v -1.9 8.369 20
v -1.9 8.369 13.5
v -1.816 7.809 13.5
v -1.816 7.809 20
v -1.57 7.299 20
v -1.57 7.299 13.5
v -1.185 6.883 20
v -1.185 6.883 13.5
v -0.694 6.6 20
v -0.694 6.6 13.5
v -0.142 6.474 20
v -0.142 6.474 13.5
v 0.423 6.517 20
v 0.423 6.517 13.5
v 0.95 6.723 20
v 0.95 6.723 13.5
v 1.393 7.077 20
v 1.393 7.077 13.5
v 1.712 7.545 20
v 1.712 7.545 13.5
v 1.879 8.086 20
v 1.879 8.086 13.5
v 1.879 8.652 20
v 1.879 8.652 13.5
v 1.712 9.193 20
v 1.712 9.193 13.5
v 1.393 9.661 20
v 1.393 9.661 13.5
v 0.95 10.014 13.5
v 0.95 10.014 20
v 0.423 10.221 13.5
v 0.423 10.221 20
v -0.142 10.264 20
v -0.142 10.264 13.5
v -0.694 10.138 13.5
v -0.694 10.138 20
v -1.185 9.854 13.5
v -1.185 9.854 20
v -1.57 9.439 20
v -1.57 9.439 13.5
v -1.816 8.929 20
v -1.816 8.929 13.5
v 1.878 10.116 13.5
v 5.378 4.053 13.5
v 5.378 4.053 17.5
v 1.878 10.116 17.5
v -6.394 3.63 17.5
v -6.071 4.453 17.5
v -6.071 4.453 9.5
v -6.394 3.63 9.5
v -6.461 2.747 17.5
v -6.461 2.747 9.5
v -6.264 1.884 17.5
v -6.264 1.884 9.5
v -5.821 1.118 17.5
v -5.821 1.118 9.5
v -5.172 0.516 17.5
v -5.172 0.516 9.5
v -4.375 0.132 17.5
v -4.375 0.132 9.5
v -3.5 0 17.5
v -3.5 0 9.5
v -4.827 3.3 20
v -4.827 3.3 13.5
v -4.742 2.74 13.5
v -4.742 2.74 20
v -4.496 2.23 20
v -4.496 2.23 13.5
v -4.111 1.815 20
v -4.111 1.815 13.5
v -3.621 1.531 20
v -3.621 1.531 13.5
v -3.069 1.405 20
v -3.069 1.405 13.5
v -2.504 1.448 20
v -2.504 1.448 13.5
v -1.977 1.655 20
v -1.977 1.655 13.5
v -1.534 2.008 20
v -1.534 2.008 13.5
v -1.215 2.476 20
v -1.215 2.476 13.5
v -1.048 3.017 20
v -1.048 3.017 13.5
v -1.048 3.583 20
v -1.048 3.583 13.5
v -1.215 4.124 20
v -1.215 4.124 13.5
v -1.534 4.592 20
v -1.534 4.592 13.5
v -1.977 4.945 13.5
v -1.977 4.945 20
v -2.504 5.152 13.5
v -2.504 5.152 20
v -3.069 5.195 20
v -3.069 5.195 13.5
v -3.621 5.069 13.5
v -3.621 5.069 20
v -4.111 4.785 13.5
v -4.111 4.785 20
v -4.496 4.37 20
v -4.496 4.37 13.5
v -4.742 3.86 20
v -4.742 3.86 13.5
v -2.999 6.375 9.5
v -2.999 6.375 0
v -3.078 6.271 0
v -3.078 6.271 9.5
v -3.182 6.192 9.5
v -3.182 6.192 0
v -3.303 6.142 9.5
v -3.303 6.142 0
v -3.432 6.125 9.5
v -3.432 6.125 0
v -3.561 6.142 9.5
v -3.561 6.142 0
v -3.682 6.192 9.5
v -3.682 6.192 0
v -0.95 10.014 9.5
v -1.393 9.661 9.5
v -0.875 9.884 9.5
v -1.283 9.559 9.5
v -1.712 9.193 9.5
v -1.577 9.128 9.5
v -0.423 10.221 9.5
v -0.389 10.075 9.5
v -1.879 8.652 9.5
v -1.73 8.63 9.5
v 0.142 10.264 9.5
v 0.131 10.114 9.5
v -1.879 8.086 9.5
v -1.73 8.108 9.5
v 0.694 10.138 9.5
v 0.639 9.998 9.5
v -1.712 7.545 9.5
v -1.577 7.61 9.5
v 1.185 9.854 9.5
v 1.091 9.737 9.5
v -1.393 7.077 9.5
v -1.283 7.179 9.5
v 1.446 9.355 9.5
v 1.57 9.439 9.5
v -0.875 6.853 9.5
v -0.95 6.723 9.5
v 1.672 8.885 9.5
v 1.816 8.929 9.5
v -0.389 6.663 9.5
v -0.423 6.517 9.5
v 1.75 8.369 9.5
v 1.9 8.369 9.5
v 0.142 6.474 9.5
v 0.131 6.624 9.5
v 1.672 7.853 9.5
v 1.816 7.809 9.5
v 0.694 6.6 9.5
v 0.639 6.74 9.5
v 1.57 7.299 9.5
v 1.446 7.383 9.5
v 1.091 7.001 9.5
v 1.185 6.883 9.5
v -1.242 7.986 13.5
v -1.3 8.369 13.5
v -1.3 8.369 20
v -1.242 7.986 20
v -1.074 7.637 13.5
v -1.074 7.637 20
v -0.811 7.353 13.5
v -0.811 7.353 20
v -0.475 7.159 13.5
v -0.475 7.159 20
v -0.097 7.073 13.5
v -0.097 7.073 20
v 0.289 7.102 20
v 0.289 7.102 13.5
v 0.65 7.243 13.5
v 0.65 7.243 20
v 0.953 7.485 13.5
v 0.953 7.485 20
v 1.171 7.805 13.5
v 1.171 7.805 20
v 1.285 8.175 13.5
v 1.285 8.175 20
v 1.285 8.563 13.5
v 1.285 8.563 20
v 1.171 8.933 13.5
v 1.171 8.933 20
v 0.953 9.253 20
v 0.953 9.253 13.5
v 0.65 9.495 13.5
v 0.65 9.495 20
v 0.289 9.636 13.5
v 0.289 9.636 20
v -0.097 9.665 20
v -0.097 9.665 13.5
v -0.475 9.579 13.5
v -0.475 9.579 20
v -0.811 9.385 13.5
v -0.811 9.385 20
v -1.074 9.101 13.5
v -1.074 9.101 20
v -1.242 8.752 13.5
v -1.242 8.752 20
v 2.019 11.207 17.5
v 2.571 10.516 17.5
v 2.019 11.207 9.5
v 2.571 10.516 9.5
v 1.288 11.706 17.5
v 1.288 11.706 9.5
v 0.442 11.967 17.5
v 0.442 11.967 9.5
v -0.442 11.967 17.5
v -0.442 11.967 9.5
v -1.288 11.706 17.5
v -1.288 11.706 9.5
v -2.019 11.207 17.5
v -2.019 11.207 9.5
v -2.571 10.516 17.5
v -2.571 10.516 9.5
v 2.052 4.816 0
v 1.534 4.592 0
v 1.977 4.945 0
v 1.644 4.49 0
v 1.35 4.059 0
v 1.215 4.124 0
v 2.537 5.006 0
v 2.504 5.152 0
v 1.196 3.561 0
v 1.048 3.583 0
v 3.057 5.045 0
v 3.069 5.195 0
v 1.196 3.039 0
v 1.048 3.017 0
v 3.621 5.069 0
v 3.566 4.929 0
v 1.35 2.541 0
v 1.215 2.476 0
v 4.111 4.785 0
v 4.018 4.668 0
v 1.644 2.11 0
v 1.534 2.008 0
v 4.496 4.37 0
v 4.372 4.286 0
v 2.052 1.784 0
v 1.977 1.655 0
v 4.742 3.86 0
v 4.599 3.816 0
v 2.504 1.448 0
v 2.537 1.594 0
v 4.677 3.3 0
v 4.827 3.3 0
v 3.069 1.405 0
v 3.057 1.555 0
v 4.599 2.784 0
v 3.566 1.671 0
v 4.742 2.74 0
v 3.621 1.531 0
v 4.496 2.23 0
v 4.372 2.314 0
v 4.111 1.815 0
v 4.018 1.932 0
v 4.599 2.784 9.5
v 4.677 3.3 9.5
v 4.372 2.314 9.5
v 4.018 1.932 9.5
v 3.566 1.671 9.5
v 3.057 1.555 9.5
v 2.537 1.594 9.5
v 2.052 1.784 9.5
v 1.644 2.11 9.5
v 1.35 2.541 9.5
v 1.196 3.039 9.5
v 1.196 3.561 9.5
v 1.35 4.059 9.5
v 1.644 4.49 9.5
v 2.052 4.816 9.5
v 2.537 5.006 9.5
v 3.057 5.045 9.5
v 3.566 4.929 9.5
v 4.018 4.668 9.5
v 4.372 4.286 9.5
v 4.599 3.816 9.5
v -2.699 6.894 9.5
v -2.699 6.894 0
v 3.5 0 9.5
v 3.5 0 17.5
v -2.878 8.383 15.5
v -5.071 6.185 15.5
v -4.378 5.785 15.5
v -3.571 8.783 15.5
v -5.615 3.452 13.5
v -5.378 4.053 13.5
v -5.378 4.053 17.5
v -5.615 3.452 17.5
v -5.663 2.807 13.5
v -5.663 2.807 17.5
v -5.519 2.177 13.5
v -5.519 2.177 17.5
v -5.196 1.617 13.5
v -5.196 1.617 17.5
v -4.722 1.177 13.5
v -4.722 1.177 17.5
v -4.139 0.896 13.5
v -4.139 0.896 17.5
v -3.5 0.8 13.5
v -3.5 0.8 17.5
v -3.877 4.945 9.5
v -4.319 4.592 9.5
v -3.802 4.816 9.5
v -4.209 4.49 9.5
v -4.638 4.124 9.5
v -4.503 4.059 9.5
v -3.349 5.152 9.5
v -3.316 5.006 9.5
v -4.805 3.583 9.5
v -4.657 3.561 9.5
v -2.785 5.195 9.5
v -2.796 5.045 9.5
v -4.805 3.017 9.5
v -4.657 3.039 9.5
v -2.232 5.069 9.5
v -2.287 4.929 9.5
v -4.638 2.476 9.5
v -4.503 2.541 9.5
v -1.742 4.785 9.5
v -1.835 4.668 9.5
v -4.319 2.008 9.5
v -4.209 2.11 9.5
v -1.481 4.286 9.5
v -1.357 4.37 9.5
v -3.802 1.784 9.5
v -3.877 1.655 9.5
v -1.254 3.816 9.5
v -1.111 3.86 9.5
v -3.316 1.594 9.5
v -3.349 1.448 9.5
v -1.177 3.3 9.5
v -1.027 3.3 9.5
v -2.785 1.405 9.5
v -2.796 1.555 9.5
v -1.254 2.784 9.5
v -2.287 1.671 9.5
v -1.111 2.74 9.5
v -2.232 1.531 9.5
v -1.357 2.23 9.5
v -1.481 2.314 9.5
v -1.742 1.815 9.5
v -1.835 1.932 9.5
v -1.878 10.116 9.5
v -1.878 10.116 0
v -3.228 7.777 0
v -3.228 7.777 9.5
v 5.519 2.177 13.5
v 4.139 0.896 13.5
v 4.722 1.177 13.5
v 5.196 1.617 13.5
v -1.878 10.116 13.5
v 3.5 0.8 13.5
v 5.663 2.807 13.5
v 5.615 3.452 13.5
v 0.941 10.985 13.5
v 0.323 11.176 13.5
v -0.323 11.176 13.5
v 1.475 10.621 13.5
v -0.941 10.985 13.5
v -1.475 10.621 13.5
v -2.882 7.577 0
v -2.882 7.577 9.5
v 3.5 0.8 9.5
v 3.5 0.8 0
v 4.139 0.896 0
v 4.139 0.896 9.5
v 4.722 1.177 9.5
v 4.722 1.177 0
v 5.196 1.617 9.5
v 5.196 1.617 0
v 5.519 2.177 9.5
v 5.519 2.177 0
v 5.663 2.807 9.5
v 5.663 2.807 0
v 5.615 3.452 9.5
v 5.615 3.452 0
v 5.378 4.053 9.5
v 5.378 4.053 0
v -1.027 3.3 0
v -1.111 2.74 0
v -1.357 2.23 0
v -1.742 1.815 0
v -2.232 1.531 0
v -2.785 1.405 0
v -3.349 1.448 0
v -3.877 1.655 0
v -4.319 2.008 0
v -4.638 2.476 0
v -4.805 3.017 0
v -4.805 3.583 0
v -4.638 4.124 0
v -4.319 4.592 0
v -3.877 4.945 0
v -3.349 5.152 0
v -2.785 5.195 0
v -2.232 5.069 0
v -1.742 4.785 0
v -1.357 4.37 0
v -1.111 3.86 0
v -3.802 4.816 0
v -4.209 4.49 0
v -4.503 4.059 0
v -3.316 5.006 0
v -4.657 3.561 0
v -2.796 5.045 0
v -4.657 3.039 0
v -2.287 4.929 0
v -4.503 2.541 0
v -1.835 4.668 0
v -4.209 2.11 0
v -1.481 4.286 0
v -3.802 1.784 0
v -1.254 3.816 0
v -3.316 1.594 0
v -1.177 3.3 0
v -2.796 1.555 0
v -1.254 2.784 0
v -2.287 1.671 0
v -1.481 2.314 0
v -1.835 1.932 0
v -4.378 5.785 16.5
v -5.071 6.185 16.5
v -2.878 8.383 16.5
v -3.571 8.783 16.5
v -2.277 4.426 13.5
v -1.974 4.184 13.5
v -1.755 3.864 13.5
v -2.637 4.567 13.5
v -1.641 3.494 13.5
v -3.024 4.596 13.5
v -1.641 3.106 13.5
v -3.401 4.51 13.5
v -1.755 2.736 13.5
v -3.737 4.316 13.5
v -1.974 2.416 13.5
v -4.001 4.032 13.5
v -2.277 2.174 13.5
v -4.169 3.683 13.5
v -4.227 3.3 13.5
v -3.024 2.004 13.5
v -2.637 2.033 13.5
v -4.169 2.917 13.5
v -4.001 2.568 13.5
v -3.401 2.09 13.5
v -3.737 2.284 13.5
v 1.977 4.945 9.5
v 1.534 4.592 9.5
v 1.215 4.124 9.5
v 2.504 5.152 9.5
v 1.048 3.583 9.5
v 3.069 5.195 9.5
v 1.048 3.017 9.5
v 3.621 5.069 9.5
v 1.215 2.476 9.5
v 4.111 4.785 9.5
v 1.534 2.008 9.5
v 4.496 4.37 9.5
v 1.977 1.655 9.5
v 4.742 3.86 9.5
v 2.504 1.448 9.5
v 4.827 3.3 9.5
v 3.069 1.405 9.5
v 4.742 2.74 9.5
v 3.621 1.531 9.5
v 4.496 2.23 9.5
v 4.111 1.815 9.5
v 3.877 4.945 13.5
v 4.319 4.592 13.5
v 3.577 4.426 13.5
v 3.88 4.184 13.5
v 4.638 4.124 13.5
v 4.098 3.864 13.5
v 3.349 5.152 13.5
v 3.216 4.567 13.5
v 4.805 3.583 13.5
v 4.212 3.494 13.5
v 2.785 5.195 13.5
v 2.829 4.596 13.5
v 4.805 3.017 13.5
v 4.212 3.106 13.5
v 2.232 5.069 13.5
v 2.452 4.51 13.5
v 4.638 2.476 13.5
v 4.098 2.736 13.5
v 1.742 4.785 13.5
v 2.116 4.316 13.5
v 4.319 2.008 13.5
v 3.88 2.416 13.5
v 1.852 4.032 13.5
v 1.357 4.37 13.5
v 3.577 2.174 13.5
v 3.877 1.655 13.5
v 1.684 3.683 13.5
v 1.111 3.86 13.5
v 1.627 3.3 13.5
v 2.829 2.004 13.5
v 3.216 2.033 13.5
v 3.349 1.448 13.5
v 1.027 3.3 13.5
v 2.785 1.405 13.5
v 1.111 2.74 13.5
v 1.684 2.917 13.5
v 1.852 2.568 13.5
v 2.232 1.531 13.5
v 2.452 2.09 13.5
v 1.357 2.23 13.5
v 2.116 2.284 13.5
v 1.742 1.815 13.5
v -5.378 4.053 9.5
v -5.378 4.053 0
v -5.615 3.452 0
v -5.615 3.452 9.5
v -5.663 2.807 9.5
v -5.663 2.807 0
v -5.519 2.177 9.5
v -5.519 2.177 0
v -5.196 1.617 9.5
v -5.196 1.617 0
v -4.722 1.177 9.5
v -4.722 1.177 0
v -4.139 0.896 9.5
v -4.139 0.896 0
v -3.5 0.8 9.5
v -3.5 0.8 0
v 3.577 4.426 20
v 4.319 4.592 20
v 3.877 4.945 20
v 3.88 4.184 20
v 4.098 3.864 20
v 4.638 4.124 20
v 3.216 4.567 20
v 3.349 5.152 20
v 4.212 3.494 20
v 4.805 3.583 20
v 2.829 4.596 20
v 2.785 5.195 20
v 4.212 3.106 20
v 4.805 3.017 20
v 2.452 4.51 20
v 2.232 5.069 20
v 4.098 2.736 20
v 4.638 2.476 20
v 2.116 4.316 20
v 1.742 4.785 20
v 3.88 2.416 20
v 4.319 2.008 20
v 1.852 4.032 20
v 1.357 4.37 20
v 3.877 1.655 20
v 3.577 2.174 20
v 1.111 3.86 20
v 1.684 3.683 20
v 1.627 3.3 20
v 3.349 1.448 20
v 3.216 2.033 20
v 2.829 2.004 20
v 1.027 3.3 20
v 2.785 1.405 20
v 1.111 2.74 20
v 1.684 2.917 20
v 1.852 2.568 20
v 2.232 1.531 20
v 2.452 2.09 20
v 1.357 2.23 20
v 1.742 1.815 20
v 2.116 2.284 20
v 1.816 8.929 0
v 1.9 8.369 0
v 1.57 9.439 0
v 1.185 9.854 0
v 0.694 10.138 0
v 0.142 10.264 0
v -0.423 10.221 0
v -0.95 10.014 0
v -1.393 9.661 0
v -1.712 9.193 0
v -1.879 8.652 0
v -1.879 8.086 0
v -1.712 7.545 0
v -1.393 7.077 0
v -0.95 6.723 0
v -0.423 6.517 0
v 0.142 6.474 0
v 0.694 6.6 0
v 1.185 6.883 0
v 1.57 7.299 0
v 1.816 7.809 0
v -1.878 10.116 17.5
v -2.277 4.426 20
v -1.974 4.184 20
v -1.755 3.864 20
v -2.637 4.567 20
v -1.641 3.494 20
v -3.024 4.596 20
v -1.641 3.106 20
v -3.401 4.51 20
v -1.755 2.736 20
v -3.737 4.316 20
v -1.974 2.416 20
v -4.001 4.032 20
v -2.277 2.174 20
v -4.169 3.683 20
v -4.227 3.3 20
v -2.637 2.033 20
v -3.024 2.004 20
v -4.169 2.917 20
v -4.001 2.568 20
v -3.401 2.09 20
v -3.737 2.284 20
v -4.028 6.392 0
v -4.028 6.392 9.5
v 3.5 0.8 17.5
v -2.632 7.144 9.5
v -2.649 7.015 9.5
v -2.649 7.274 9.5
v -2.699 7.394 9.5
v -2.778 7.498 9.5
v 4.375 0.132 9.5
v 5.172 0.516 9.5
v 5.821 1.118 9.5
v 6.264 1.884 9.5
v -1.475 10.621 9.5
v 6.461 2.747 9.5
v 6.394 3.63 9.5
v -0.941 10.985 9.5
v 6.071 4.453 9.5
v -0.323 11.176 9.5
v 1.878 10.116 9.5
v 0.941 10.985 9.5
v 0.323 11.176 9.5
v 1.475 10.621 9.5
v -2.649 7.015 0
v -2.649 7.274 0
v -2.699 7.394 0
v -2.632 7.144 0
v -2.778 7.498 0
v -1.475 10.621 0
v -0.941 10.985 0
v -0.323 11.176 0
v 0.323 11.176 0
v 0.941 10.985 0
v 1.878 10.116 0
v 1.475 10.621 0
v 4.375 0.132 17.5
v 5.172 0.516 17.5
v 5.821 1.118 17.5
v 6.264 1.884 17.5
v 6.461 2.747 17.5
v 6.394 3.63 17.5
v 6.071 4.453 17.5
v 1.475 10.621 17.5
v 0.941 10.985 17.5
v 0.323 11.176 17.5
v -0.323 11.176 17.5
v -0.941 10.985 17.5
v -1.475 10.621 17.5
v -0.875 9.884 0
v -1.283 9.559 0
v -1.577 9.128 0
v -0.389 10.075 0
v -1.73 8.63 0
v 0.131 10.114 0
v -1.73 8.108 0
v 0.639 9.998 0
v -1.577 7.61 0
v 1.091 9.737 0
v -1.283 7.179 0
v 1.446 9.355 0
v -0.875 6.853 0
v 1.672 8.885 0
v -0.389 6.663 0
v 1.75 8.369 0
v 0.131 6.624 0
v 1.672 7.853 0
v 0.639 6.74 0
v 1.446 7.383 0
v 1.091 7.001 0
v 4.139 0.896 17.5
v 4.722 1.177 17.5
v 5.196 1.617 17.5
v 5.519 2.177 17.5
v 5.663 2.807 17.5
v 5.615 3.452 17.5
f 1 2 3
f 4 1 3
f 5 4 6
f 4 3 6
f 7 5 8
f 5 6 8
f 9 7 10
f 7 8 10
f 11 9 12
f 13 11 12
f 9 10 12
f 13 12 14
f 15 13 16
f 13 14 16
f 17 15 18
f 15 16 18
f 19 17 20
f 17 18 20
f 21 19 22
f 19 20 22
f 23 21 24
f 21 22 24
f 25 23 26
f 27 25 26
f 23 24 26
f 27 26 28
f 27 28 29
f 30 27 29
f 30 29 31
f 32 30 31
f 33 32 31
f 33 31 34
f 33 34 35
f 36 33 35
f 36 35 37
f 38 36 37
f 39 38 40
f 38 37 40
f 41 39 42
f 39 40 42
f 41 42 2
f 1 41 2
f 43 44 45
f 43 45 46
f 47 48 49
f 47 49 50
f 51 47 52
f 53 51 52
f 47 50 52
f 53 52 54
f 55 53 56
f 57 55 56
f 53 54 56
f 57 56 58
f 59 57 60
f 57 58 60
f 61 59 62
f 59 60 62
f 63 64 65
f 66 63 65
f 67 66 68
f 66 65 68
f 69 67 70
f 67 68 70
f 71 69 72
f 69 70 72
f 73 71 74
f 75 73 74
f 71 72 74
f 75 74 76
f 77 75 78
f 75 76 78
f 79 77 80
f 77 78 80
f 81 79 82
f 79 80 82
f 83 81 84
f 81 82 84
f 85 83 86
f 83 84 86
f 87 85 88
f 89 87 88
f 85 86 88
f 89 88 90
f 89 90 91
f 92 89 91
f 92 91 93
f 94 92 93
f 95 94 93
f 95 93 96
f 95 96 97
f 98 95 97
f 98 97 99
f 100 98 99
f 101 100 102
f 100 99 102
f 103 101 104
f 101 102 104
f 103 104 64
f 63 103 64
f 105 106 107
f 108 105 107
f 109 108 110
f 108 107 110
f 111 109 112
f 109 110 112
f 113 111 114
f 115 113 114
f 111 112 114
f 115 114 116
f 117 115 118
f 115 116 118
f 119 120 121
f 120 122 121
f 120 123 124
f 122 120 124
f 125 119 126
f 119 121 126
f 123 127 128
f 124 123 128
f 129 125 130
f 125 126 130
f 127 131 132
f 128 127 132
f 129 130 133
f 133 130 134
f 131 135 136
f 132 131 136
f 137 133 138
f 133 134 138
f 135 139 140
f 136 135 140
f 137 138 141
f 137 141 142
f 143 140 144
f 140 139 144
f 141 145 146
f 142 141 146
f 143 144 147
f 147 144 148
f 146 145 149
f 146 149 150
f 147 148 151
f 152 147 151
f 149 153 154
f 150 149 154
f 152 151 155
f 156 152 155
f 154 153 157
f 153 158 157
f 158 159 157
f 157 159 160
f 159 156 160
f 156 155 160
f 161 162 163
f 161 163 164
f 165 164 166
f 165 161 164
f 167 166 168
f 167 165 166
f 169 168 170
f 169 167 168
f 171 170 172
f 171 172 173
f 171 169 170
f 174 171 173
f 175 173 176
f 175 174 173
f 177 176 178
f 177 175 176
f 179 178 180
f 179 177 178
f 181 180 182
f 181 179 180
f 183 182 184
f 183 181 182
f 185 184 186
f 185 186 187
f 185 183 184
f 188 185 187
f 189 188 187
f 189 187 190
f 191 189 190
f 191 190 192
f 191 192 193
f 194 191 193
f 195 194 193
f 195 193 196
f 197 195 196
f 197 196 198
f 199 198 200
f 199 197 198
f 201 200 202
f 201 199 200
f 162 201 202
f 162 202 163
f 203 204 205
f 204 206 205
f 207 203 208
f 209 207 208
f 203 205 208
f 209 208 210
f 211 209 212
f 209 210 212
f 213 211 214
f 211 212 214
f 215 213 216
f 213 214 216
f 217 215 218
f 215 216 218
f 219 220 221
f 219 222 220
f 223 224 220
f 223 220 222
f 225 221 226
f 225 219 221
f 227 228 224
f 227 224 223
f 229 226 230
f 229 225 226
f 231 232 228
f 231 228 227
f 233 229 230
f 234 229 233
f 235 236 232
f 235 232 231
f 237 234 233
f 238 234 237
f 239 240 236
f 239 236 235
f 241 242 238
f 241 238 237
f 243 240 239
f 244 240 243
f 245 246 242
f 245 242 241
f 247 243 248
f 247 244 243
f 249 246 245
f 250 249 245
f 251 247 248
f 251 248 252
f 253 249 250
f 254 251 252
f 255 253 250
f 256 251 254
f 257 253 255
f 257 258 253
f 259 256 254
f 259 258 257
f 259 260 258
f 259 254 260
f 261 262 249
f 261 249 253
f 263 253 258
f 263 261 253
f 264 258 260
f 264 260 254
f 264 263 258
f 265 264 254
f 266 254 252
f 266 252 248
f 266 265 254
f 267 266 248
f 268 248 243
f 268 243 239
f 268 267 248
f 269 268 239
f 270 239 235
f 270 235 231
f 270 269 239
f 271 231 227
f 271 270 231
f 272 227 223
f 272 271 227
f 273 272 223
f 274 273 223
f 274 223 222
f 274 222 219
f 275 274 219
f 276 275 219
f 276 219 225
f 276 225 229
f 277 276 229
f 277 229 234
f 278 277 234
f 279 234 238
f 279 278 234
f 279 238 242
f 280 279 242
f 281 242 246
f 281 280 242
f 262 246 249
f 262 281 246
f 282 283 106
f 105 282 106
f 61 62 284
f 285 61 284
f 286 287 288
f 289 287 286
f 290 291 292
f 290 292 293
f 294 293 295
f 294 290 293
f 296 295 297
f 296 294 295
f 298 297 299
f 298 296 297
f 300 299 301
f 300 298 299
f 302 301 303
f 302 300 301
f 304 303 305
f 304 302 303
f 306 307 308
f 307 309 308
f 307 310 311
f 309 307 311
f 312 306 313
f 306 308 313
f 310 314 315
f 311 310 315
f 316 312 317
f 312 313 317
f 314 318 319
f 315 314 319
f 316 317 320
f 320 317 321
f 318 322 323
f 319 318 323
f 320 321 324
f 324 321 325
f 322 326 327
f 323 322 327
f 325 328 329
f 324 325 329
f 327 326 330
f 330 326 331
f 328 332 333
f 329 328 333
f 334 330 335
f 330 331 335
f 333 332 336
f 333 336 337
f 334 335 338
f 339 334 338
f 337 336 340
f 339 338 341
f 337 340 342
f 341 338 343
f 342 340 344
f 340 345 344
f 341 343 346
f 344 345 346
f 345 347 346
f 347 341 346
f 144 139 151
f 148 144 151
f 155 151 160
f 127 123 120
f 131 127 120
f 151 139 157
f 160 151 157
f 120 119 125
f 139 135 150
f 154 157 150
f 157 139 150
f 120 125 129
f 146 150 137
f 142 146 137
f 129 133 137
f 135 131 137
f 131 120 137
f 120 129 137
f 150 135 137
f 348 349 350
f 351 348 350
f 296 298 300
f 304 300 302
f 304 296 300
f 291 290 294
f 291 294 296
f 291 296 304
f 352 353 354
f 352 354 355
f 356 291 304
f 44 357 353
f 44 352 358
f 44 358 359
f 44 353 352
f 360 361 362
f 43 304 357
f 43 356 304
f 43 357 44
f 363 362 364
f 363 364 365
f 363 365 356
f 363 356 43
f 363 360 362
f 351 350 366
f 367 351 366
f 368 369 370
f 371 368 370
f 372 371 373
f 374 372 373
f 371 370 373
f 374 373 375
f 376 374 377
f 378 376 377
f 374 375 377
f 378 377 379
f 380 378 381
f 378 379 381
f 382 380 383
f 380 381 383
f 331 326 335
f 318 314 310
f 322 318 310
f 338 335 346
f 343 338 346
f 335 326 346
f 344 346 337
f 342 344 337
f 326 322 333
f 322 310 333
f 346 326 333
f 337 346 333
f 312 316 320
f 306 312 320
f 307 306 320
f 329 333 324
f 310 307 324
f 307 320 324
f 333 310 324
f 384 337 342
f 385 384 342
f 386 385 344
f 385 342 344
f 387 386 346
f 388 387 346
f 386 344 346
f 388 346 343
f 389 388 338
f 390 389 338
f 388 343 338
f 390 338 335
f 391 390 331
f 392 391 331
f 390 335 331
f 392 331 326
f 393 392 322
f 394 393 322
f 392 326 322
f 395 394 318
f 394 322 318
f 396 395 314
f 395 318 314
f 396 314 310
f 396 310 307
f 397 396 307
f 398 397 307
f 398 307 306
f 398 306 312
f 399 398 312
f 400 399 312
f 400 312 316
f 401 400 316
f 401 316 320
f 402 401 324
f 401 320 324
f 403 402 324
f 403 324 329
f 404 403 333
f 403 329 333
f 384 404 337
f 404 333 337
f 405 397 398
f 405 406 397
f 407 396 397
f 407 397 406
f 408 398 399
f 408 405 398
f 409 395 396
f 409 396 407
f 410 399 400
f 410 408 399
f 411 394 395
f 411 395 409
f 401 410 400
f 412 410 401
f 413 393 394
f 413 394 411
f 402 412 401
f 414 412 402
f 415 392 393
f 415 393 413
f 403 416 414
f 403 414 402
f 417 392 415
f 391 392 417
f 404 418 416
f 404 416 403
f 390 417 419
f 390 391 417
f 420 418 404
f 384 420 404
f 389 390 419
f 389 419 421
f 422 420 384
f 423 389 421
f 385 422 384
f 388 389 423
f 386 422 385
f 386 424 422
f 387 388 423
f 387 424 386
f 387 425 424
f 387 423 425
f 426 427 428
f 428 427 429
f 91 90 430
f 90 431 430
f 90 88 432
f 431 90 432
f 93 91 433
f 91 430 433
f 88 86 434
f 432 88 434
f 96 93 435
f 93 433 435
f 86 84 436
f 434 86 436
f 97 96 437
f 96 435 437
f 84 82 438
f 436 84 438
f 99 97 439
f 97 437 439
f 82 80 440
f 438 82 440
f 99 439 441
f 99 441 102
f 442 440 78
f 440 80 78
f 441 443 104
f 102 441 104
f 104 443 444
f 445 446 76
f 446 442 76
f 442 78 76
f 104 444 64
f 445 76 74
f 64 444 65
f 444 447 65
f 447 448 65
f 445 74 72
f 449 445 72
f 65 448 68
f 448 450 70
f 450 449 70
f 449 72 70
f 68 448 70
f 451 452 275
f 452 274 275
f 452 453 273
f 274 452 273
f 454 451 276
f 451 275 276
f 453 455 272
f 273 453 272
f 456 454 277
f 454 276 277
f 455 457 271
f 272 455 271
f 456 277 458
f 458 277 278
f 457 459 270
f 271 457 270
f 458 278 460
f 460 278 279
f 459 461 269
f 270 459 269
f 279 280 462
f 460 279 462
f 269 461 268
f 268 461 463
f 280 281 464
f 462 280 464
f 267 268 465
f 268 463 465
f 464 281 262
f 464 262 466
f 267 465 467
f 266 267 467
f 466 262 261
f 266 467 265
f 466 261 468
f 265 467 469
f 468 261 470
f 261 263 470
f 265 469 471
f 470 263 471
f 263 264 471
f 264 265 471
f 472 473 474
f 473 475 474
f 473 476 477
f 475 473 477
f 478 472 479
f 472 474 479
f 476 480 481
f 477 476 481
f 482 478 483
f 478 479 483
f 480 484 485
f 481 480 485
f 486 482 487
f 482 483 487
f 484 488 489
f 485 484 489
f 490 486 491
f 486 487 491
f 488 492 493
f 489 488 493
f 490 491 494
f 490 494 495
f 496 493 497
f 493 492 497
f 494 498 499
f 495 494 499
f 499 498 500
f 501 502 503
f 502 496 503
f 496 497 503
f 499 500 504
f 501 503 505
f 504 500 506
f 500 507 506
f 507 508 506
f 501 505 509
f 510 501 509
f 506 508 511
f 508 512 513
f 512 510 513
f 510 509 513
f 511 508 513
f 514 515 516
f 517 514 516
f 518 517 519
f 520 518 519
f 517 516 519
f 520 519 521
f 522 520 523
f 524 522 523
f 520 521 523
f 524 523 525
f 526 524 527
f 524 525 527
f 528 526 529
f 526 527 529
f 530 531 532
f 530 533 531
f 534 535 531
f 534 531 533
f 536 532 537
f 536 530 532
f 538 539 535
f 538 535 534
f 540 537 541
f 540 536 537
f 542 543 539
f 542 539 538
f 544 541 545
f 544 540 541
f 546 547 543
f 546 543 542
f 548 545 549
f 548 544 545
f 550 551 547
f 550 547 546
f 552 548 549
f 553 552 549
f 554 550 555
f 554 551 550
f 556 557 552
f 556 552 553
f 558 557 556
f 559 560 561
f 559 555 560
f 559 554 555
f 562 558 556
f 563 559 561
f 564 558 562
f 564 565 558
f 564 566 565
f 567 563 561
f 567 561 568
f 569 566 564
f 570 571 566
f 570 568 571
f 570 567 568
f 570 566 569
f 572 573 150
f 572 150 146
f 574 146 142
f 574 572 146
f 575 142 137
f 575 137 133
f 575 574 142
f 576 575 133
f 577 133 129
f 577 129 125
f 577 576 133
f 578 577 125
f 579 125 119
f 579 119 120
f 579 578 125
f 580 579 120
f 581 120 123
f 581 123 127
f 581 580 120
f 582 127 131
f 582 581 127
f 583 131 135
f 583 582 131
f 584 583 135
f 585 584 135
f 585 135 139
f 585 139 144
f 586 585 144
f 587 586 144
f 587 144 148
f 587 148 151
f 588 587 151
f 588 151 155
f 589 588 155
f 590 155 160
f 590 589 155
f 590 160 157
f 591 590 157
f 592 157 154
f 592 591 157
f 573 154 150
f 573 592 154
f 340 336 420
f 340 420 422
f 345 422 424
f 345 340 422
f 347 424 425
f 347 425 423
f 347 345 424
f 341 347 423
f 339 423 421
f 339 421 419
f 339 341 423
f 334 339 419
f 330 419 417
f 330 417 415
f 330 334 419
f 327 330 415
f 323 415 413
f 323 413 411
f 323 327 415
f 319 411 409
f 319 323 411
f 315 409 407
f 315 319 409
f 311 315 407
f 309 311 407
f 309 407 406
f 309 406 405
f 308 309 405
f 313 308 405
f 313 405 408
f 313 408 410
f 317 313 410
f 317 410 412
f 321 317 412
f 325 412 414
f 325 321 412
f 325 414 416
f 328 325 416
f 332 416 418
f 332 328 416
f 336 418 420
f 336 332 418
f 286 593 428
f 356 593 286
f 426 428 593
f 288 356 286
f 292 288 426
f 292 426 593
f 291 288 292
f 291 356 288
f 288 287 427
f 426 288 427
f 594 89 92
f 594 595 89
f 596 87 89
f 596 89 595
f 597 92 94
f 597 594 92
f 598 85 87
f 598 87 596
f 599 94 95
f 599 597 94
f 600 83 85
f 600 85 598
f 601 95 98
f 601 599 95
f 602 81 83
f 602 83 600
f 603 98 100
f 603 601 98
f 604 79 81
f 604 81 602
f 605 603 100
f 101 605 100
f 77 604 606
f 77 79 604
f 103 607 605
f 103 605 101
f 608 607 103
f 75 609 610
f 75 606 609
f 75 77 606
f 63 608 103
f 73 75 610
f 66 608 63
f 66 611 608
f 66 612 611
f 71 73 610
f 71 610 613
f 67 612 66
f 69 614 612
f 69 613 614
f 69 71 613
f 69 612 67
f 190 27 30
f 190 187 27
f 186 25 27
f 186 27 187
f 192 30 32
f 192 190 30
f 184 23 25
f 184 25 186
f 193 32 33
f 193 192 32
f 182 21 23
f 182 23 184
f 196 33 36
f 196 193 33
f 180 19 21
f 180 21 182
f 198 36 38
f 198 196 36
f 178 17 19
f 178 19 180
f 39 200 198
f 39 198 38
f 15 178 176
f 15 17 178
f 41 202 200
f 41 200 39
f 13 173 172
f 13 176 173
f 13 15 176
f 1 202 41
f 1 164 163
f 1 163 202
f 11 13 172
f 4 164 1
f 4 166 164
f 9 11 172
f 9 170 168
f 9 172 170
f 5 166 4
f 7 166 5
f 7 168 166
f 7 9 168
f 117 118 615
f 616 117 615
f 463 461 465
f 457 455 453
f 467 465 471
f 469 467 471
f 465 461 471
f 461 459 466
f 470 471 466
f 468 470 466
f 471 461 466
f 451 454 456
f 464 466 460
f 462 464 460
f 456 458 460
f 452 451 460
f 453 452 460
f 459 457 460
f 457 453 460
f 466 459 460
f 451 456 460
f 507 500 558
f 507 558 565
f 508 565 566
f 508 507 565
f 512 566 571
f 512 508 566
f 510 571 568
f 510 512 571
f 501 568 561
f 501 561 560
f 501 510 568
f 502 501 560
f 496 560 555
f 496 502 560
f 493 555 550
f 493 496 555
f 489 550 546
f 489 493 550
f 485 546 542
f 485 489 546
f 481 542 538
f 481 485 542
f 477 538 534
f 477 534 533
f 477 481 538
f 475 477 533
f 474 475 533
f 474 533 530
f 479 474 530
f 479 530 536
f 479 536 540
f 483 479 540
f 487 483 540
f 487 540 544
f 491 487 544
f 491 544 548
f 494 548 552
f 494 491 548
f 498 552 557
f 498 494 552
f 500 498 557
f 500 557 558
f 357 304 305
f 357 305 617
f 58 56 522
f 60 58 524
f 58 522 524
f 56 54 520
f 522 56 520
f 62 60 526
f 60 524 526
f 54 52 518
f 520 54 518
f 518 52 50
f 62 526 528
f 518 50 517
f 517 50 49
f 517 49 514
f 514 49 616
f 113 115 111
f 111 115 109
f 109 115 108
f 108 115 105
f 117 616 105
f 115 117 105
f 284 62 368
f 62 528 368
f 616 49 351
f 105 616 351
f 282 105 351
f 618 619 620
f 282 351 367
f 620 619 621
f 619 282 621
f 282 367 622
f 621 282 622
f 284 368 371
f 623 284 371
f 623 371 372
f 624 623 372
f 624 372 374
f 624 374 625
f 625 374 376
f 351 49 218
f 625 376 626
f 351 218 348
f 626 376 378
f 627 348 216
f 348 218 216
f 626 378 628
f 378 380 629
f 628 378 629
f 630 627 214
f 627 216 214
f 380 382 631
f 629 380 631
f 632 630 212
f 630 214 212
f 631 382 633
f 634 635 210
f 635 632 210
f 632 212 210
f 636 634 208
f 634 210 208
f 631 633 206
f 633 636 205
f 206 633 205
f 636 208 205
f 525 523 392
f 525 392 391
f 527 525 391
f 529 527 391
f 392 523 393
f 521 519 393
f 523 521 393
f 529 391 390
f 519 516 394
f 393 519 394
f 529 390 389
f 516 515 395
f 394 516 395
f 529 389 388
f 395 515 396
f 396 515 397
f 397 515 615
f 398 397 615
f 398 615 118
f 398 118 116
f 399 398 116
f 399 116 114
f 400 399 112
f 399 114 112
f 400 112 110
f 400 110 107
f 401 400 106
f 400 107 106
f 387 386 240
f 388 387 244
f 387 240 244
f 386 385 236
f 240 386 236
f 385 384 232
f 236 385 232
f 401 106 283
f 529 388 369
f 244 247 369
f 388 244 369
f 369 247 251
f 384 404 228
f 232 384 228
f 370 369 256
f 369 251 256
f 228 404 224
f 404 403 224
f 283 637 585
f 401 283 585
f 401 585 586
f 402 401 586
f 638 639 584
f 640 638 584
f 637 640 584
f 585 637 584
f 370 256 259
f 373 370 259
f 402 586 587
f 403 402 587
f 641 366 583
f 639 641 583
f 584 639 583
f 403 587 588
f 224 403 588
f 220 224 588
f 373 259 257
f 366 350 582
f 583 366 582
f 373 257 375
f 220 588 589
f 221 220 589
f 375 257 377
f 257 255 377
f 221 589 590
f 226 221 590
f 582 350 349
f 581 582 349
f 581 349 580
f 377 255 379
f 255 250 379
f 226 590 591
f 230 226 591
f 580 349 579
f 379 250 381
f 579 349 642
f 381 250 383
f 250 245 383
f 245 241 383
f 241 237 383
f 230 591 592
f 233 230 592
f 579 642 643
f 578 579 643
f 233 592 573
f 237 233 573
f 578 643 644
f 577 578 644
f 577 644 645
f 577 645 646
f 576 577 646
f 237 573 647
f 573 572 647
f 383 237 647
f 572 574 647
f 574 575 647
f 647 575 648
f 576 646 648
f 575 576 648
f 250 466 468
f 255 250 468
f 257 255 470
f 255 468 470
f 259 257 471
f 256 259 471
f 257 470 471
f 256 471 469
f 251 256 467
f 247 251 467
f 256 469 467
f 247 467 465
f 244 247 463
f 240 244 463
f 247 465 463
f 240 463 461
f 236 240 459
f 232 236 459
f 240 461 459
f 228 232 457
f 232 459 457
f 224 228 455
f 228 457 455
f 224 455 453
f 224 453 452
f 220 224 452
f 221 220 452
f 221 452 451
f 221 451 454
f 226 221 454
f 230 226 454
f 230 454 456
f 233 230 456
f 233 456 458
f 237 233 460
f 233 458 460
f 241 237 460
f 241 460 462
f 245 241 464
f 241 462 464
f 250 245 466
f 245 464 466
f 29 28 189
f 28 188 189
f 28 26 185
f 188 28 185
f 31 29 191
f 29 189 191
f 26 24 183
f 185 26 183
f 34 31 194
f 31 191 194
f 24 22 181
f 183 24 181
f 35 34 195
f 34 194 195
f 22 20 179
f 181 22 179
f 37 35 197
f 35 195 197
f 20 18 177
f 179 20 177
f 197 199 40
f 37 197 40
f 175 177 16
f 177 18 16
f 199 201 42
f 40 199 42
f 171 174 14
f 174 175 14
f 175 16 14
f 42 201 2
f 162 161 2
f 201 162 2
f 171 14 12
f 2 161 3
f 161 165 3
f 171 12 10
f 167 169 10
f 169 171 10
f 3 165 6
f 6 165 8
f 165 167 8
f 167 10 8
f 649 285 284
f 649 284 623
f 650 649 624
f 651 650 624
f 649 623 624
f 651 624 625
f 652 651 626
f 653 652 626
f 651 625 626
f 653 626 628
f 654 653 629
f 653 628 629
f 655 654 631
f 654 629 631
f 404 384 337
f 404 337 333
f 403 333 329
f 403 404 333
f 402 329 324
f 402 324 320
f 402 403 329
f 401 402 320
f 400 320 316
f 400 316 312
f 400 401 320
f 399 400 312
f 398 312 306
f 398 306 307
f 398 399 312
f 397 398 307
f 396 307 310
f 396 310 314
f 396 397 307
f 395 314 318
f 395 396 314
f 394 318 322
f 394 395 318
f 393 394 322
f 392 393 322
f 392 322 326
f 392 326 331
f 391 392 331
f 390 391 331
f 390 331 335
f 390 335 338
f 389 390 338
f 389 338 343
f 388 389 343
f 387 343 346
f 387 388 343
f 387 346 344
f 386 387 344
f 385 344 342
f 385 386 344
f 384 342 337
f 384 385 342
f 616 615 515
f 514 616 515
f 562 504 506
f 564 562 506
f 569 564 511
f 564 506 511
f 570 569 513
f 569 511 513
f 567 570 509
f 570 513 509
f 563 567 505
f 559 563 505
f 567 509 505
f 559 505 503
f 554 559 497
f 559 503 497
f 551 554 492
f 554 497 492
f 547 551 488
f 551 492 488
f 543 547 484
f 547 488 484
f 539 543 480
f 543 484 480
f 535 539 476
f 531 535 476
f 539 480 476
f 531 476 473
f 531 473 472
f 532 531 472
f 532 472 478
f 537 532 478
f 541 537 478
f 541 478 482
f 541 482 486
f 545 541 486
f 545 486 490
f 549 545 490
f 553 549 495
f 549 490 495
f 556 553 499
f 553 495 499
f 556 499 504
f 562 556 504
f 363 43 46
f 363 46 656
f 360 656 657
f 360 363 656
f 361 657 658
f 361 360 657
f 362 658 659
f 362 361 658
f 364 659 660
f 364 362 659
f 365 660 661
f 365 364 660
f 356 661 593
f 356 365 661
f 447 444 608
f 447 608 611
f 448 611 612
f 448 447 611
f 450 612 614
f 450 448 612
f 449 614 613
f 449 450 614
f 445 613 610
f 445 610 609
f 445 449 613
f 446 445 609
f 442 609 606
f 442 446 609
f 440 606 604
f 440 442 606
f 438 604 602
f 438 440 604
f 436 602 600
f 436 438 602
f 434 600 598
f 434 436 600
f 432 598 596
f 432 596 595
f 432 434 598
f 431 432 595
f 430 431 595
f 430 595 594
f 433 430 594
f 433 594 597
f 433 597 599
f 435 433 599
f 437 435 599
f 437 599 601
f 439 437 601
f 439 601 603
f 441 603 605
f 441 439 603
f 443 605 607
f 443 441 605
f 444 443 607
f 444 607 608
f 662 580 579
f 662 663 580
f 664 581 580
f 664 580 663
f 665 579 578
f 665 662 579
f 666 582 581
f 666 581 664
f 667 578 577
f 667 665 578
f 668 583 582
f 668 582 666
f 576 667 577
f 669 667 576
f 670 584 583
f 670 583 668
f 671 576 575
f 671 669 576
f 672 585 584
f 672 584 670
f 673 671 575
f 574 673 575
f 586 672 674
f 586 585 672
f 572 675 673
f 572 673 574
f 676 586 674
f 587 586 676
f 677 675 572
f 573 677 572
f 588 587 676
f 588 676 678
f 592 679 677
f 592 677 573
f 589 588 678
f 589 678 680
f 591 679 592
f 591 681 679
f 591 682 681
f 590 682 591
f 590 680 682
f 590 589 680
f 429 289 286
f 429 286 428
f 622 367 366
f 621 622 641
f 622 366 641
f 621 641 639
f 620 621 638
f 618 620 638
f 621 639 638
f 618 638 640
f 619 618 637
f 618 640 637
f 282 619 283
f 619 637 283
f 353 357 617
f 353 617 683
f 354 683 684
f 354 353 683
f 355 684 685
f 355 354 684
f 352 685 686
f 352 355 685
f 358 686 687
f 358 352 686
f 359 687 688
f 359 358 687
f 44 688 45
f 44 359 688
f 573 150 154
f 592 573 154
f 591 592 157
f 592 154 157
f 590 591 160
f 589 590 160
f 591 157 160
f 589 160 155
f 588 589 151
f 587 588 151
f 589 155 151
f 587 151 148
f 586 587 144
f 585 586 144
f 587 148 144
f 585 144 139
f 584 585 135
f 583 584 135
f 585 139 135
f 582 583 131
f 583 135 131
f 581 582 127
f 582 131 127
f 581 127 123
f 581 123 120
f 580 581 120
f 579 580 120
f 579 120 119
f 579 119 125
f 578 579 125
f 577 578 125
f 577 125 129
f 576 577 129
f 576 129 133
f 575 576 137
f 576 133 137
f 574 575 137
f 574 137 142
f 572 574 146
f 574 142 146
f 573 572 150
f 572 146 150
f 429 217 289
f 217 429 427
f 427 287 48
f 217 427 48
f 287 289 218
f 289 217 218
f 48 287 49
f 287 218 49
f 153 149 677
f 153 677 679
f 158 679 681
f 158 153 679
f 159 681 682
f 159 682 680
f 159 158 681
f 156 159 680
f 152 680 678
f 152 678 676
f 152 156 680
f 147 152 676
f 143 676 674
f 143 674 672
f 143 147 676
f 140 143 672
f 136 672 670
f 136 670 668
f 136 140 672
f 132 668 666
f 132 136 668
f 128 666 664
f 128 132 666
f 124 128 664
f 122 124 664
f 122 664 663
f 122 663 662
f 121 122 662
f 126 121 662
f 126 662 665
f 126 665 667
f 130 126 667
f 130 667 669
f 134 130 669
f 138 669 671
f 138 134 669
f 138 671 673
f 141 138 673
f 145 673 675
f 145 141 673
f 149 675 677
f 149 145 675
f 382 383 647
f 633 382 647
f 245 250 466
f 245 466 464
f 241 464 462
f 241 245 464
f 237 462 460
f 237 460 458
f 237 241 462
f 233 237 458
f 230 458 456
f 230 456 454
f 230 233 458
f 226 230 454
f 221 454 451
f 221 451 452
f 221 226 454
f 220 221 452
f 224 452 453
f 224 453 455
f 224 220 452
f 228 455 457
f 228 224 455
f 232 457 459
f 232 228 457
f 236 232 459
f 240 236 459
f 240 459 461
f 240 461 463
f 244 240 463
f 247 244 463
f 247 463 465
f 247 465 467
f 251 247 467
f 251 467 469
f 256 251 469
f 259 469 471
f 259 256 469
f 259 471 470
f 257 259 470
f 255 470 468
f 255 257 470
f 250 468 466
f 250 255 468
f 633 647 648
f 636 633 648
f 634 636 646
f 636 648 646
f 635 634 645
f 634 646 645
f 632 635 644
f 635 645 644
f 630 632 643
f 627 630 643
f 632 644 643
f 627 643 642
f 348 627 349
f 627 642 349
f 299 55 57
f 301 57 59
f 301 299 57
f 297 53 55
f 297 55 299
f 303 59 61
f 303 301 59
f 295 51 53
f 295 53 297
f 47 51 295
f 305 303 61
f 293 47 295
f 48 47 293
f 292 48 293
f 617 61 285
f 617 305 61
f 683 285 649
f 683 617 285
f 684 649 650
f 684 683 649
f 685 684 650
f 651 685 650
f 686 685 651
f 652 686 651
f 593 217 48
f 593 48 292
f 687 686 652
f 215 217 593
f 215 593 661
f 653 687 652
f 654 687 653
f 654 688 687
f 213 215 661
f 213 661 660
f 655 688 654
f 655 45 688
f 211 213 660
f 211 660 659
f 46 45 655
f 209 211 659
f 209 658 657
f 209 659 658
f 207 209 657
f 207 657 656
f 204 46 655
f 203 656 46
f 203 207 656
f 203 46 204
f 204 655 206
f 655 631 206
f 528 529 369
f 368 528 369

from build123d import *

# Parameters (mm, degrees)
SKETCH_1_R          = 1.9
EXTRUDE_1_DEPTH     = 9.5
EXTRUDE_2_DEPTH     = 4
EXTRUDE_3_DEPTH     = 4
SKETCH_4_R          = 1.9
SKETCH_4_R_2        = 1.75
EXTRUDE_4_DEPTH     = 9.5
EXTRUDE_4_2_DEPTH   = 9.5
EXTRUDE_4_3_DEPTH   = 9.5
SKETCH_5_R          = 1.9
SKETCH_5_R_2        = 1.3
EXTRUDE_5_DEPTH     = 6.5
EXTRUDE_5_2_DEPTH   = 6.5
EXTRUDE_5_3_DEPTH   = 6.5
SKETCH_6_W          = 1
SKETCH_6_H          = 3
CUT_EXTRUDE_1_DEPTH = 1


with BuildPart() as part:
    # Эскиз1 → Бобышка-Вытянуть1 (new body)
    with BuildSketch(Plane.XY):
        with BuildLine():
            Line((-1.8783321, 10.115544457), (-3.2283321, 7.777275866))
            Line((-3.2283321, 7.777275866), (-2.881921938, 7.577275866))
            ThreePointArc((-2.881921938, 7.577275866), (-2.648959025, 7.273672687), (-2.698909236, 6.894263165))
            Line((-2.698909236, 6.894263165), (-2.998909236, 6.374647922))
            ThreePointArc((-2.998909236, 6.374647922), (-3.302512416, 6.141685009), (-3.681921938, 6.19163522))
            Line((-3.681921938, 6.19163522), (-4.0283321, 6.39163522))
            Line((-4.0283321, 6.39163522), (-5.3783321, 4.05336663))
            ThreePointArc((-5.3783321, 4.05336663), (-5.3783321, 1.884455543), (-3.5, 0.8))
            Line((-3.5, 0.8), (3.5, 0.8))
            ThreePointArc((3.5, 0.8), (5.3783321, 1.884455543), (5.3783321, 4.05336663))
            Line((5.3783321, 4.05336663), (1.8783321, 10.115544457))
            ThreePointArc((1.8783321, 10.115544457), (0, 11.2), (-1.8783321, 10.115544457))
        make_face()
        with Locations((-2.92653718, 3.3)):
            Circle(SKETCH_1_R, mode=Mode.SUBTRACT)
        with Locations((0, 8.368911087)):
            Circle(SKETCH_1_R, mode=Mode.SUBTRACT)
        with Locations((2.92653718, 3.3)):
            Circle(SKETCH_1_R, mode=Mode.SUBTRACT)
    extrude(amount=EXTRUDE_1_DEPTH)

    # Эскиз2 → Бобышка-Вытянуть2 (add)
    with BuildSketch(Plane.XY.offset(9.5)):
        with BuildLine():
            Line((6.071152423, 4.45336663), (2.571152423, 10.515544457))
            ThreePointArc((2.571152423, 10.515544457), (0, 12), (-2.571152423, 10.515544457))
            Line((-2.571152423, 10.515544457), (-6.071152423, 4.45336663))
            ThreePointArc((-6.071152423, 4.45336663), (-6.071152423, 1.484455543), (-3.5, 0))
            Line((-3.5, 0), (3.5, 0))
            ThreePointArc((3.5, 0), (6.071152423, 1.484455543), (6.071152423, 4.45336663))
        make_face()
    extrude(amount=EXTRUDE_2_DEPTH)

    # Эскиз3 → Бобышка-Вытянуть3 (add)
    with BuildSketch(Plane.XY.offset(13.5)):
        with BuildLine():
            Line((-3.5, 0), (3.5, 0))
            ThreePointArc((3.5, 0), (6.071152423, 1.484455543), (6.071152423, 4.45336663))
            Line((6.071152423, 4.45336663), (2.571152423, 10.515544457))
            ThreePointArc((2.571152423, 10.515544457), (0, 12), (-2.571152423, 10.515544457))
            Line((-2.571152423, 10.515544457), (-6.071152423, 4.45336663))
            ThreePointArc((-6.071152423, 4.45336663), (-6.071152423, 1.484455543), (-3.5, 0))
        make_face()
        with BuildLine():
            ThreePointArc((3.5, 0.8), (5.3783321, 1.884455543), (5.3783321, 4.05336663))
            Line((5.3783321, 4.05336663), (1.8783321, 10.115544457))
            ThreePointArc((1.8783321, 10.115544457), (0, 11.2), (-1.8783321, 10.115544457))
            Line((-1.8783321, 10.115544457), (-5.3783321, 4.05336663))
            ThreePointArc((-5.3783321, 4.05336663), (-5.3783321, 1.884455543), (-3.5, 0.8))
            Line((-3.5, 0.8), (3.5, 0.8))
        make_face(mode=Mode.SUBTRACT)
    extrude(amount=EXTRUDE_3_DEPTH)

    # Эскиз6 → Вырез-Вытянуть1 (cut)
    with BuildSketch(Plane(origin=(-6.481728634, 3.742227772, 0), x_dir=(0, 0, 1), z_dir=(-0.8660254037844387, 0.49999999999999994, 0))):
        with Locations((16, 4.321152423)):
            Rectangle(SKETCH_6_W, SKETCH_6_H)
    extrude(amount=-CUT_EXTRUDE_1_DEPTH, mode=Mode.SUBTRACT)


with BuildPart() as body_2:
    # Эскиз4 → Бобышка-Вытянуть4 (new body)
    with BuildSketch(Plane(origin=(0, 0, 9.5), x_dir=(-1, 0, 0), z_dir=(0, 0, -1))):
        with Locations(Location((0, 8.368911087, 0), (0, 0, 180))):
            Circle(SKETCH_4_R)
        with Locations(Location((0, 8.368911087, 0), (0, 0, 180))):
            Circle(SKETCH_4_R_2, mode=Mode.SUBTRACT)
    extrude(amount=EXTRUDE_4_DEPTH)


with BuildPart() as body_3:
    # Эскиз4 → Extrude 4 2 (new body)
    with BuildSketch(Plane(origin=(0, 0, 9.5), x_dir=(-1, 0, 0), z_dir=(0, 0, -1))):
        with Locations(Location((-2.92653718, 3.3, 0), (0, 0, 180))):
            Circle(SKETCH_4_R)
        with Locations(Location((-2.92653718, 3.3, 0), (0, 0, 180))):
            Circle(SKETCH_4_R_2, mode=Mode.SUBTRACT)
    extrude(amount=EXTRUDE_4_2_DEPTH)


with BuildPart() as body_4:
    # Эскиз4 → Extrude 4 3 (new body)
    with BuildSketch(Plane(origin=(0, 0, 9.5), x_dir=(-1, 0, 0), z_dir=(0, 0, -1))):
        with Locations(Location((2.92653718, 3.3, 0), (0, 0, 180))):
            Circle(SKETCH_4_R)
        with Locations(Location((2.92653718, 3.3, 0), (0, 0, 180))):
            Circle(SKETCH_4_R_2, mode=Mode.SUBTRACT)
    extrude(amount=EXTRUDE_4_3_DEPTH)


with BuildPart() as body_5:
    # Эскиз5 → Бобышка-Вытянуть5 (new body)
    with BuildSketch(Plane.XY.offset(13.5)):
        with Locations(Location((0, 8.368911087, 0), (0, 0, 180))):
            Circle(SKETCH_5_R)
        with Locations(Location((0, 8.368911087, 0), (0, 0, 180))):
            Circle(SKETCH_5_R_2, mode=Mode.SUBTRACT)
    extrude(amount=EXTRUDE_5_DEPTH)


with BuildPart() as body_6:
    # Эскиз5 → Extrude 5 2 (new body)
    with BuildSketch(Plane.XY.offset(13.5)):
        with Locations(Location((2.92653718, 3.3, 0), (0, 0, 180))):
            Circle(SKETCH_5_R)
        with Locations(Location((2.92653718, 3.3, 0), (0, 0, 180))):
            Circle(SKETCH_5_R_2, mode=Mode.SUBTRACT)
    extrude(amount=EXTRUDE_5_2_DEPTH)


with BuildPart() as body_7:
    # Эскиз5 → Extrude 5 3 (new body)
    with BuildSketch(Plane.XY.offset(13.5)):
        with Locations(Location((-2.92653718, 3.3, 0), (0, 0, 180))):
            Circle(SKETCH_5_R)
        with Locations(Location((-2.92653718, 3.3, 0), (0, 0, 180))):
            Circle(SKETCH_5_R_2, mode=Mode.SUBTRACT)
    extrude(amount=EXTRUDE_5_3_DEPTH)


solid = Compound([part.part, body_2.part, body_3.part, body_4.part, body_5.part, body_6.part, body_7.part])
